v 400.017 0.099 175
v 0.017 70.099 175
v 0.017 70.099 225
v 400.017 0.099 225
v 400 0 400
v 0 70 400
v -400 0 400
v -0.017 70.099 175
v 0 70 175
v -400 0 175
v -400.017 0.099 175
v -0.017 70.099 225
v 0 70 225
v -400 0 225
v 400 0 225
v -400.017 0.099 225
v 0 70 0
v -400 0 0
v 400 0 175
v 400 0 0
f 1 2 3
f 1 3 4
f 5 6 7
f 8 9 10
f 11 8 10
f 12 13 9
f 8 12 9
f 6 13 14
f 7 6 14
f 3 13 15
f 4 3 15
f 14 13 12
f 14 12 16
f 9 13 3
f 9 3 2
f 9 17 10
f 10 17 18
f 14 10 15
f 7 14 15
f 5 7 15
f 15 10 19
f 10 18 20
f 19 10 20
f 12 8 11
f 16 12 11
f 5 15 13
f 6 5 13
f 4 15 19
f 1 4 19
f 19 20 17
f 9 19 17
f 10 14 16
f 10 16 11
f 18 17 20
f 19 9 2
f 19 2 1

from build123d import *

# Parameters (mm, degrees)
EXTRUDE_1_DEPTH = 400
SKETCH_2_W      = 406.078810085
SKETCH_2_H      = 50
EXTRUDE_2_DEPTH = 0.1


with BuildPart() as part:
    # Эскиз1 → Бобышка-Вытянуть1 (new body)
    with BuildSketch(Plane.XY):
        Polygon((-400, 0), (400, 0), (0, 70), align=None)
    extrude(amount=EXTRUDE_1_DEPTH)

    # Эскиз2 → Бобышка-Вытянуть2 (add)
    with BuildSketch(Plane(origin=(11.88599151, 67.919951486, 0), x_dir=(0.9850304671557042, -0.17238033175224823, 0), z_dir=(0.17238033175224823, 0.9850304671557042, 0))):
        with Locations((190.972781819, -200)):
            Rectangle(SKETCH_2_W, SKETCH_2_H)
    extrude_2 = extrude(amount=EXTRUDE_2_DEPTH)

    # Зеркальное отражение1: Бобышка-Вытянуть2 across plane
    add(extrude_2.mirror(Plane(origin=(0, 0, 0), x_dir=(0, 0, 1), z_dir=(1, 0, 0))))


solid = part.part
